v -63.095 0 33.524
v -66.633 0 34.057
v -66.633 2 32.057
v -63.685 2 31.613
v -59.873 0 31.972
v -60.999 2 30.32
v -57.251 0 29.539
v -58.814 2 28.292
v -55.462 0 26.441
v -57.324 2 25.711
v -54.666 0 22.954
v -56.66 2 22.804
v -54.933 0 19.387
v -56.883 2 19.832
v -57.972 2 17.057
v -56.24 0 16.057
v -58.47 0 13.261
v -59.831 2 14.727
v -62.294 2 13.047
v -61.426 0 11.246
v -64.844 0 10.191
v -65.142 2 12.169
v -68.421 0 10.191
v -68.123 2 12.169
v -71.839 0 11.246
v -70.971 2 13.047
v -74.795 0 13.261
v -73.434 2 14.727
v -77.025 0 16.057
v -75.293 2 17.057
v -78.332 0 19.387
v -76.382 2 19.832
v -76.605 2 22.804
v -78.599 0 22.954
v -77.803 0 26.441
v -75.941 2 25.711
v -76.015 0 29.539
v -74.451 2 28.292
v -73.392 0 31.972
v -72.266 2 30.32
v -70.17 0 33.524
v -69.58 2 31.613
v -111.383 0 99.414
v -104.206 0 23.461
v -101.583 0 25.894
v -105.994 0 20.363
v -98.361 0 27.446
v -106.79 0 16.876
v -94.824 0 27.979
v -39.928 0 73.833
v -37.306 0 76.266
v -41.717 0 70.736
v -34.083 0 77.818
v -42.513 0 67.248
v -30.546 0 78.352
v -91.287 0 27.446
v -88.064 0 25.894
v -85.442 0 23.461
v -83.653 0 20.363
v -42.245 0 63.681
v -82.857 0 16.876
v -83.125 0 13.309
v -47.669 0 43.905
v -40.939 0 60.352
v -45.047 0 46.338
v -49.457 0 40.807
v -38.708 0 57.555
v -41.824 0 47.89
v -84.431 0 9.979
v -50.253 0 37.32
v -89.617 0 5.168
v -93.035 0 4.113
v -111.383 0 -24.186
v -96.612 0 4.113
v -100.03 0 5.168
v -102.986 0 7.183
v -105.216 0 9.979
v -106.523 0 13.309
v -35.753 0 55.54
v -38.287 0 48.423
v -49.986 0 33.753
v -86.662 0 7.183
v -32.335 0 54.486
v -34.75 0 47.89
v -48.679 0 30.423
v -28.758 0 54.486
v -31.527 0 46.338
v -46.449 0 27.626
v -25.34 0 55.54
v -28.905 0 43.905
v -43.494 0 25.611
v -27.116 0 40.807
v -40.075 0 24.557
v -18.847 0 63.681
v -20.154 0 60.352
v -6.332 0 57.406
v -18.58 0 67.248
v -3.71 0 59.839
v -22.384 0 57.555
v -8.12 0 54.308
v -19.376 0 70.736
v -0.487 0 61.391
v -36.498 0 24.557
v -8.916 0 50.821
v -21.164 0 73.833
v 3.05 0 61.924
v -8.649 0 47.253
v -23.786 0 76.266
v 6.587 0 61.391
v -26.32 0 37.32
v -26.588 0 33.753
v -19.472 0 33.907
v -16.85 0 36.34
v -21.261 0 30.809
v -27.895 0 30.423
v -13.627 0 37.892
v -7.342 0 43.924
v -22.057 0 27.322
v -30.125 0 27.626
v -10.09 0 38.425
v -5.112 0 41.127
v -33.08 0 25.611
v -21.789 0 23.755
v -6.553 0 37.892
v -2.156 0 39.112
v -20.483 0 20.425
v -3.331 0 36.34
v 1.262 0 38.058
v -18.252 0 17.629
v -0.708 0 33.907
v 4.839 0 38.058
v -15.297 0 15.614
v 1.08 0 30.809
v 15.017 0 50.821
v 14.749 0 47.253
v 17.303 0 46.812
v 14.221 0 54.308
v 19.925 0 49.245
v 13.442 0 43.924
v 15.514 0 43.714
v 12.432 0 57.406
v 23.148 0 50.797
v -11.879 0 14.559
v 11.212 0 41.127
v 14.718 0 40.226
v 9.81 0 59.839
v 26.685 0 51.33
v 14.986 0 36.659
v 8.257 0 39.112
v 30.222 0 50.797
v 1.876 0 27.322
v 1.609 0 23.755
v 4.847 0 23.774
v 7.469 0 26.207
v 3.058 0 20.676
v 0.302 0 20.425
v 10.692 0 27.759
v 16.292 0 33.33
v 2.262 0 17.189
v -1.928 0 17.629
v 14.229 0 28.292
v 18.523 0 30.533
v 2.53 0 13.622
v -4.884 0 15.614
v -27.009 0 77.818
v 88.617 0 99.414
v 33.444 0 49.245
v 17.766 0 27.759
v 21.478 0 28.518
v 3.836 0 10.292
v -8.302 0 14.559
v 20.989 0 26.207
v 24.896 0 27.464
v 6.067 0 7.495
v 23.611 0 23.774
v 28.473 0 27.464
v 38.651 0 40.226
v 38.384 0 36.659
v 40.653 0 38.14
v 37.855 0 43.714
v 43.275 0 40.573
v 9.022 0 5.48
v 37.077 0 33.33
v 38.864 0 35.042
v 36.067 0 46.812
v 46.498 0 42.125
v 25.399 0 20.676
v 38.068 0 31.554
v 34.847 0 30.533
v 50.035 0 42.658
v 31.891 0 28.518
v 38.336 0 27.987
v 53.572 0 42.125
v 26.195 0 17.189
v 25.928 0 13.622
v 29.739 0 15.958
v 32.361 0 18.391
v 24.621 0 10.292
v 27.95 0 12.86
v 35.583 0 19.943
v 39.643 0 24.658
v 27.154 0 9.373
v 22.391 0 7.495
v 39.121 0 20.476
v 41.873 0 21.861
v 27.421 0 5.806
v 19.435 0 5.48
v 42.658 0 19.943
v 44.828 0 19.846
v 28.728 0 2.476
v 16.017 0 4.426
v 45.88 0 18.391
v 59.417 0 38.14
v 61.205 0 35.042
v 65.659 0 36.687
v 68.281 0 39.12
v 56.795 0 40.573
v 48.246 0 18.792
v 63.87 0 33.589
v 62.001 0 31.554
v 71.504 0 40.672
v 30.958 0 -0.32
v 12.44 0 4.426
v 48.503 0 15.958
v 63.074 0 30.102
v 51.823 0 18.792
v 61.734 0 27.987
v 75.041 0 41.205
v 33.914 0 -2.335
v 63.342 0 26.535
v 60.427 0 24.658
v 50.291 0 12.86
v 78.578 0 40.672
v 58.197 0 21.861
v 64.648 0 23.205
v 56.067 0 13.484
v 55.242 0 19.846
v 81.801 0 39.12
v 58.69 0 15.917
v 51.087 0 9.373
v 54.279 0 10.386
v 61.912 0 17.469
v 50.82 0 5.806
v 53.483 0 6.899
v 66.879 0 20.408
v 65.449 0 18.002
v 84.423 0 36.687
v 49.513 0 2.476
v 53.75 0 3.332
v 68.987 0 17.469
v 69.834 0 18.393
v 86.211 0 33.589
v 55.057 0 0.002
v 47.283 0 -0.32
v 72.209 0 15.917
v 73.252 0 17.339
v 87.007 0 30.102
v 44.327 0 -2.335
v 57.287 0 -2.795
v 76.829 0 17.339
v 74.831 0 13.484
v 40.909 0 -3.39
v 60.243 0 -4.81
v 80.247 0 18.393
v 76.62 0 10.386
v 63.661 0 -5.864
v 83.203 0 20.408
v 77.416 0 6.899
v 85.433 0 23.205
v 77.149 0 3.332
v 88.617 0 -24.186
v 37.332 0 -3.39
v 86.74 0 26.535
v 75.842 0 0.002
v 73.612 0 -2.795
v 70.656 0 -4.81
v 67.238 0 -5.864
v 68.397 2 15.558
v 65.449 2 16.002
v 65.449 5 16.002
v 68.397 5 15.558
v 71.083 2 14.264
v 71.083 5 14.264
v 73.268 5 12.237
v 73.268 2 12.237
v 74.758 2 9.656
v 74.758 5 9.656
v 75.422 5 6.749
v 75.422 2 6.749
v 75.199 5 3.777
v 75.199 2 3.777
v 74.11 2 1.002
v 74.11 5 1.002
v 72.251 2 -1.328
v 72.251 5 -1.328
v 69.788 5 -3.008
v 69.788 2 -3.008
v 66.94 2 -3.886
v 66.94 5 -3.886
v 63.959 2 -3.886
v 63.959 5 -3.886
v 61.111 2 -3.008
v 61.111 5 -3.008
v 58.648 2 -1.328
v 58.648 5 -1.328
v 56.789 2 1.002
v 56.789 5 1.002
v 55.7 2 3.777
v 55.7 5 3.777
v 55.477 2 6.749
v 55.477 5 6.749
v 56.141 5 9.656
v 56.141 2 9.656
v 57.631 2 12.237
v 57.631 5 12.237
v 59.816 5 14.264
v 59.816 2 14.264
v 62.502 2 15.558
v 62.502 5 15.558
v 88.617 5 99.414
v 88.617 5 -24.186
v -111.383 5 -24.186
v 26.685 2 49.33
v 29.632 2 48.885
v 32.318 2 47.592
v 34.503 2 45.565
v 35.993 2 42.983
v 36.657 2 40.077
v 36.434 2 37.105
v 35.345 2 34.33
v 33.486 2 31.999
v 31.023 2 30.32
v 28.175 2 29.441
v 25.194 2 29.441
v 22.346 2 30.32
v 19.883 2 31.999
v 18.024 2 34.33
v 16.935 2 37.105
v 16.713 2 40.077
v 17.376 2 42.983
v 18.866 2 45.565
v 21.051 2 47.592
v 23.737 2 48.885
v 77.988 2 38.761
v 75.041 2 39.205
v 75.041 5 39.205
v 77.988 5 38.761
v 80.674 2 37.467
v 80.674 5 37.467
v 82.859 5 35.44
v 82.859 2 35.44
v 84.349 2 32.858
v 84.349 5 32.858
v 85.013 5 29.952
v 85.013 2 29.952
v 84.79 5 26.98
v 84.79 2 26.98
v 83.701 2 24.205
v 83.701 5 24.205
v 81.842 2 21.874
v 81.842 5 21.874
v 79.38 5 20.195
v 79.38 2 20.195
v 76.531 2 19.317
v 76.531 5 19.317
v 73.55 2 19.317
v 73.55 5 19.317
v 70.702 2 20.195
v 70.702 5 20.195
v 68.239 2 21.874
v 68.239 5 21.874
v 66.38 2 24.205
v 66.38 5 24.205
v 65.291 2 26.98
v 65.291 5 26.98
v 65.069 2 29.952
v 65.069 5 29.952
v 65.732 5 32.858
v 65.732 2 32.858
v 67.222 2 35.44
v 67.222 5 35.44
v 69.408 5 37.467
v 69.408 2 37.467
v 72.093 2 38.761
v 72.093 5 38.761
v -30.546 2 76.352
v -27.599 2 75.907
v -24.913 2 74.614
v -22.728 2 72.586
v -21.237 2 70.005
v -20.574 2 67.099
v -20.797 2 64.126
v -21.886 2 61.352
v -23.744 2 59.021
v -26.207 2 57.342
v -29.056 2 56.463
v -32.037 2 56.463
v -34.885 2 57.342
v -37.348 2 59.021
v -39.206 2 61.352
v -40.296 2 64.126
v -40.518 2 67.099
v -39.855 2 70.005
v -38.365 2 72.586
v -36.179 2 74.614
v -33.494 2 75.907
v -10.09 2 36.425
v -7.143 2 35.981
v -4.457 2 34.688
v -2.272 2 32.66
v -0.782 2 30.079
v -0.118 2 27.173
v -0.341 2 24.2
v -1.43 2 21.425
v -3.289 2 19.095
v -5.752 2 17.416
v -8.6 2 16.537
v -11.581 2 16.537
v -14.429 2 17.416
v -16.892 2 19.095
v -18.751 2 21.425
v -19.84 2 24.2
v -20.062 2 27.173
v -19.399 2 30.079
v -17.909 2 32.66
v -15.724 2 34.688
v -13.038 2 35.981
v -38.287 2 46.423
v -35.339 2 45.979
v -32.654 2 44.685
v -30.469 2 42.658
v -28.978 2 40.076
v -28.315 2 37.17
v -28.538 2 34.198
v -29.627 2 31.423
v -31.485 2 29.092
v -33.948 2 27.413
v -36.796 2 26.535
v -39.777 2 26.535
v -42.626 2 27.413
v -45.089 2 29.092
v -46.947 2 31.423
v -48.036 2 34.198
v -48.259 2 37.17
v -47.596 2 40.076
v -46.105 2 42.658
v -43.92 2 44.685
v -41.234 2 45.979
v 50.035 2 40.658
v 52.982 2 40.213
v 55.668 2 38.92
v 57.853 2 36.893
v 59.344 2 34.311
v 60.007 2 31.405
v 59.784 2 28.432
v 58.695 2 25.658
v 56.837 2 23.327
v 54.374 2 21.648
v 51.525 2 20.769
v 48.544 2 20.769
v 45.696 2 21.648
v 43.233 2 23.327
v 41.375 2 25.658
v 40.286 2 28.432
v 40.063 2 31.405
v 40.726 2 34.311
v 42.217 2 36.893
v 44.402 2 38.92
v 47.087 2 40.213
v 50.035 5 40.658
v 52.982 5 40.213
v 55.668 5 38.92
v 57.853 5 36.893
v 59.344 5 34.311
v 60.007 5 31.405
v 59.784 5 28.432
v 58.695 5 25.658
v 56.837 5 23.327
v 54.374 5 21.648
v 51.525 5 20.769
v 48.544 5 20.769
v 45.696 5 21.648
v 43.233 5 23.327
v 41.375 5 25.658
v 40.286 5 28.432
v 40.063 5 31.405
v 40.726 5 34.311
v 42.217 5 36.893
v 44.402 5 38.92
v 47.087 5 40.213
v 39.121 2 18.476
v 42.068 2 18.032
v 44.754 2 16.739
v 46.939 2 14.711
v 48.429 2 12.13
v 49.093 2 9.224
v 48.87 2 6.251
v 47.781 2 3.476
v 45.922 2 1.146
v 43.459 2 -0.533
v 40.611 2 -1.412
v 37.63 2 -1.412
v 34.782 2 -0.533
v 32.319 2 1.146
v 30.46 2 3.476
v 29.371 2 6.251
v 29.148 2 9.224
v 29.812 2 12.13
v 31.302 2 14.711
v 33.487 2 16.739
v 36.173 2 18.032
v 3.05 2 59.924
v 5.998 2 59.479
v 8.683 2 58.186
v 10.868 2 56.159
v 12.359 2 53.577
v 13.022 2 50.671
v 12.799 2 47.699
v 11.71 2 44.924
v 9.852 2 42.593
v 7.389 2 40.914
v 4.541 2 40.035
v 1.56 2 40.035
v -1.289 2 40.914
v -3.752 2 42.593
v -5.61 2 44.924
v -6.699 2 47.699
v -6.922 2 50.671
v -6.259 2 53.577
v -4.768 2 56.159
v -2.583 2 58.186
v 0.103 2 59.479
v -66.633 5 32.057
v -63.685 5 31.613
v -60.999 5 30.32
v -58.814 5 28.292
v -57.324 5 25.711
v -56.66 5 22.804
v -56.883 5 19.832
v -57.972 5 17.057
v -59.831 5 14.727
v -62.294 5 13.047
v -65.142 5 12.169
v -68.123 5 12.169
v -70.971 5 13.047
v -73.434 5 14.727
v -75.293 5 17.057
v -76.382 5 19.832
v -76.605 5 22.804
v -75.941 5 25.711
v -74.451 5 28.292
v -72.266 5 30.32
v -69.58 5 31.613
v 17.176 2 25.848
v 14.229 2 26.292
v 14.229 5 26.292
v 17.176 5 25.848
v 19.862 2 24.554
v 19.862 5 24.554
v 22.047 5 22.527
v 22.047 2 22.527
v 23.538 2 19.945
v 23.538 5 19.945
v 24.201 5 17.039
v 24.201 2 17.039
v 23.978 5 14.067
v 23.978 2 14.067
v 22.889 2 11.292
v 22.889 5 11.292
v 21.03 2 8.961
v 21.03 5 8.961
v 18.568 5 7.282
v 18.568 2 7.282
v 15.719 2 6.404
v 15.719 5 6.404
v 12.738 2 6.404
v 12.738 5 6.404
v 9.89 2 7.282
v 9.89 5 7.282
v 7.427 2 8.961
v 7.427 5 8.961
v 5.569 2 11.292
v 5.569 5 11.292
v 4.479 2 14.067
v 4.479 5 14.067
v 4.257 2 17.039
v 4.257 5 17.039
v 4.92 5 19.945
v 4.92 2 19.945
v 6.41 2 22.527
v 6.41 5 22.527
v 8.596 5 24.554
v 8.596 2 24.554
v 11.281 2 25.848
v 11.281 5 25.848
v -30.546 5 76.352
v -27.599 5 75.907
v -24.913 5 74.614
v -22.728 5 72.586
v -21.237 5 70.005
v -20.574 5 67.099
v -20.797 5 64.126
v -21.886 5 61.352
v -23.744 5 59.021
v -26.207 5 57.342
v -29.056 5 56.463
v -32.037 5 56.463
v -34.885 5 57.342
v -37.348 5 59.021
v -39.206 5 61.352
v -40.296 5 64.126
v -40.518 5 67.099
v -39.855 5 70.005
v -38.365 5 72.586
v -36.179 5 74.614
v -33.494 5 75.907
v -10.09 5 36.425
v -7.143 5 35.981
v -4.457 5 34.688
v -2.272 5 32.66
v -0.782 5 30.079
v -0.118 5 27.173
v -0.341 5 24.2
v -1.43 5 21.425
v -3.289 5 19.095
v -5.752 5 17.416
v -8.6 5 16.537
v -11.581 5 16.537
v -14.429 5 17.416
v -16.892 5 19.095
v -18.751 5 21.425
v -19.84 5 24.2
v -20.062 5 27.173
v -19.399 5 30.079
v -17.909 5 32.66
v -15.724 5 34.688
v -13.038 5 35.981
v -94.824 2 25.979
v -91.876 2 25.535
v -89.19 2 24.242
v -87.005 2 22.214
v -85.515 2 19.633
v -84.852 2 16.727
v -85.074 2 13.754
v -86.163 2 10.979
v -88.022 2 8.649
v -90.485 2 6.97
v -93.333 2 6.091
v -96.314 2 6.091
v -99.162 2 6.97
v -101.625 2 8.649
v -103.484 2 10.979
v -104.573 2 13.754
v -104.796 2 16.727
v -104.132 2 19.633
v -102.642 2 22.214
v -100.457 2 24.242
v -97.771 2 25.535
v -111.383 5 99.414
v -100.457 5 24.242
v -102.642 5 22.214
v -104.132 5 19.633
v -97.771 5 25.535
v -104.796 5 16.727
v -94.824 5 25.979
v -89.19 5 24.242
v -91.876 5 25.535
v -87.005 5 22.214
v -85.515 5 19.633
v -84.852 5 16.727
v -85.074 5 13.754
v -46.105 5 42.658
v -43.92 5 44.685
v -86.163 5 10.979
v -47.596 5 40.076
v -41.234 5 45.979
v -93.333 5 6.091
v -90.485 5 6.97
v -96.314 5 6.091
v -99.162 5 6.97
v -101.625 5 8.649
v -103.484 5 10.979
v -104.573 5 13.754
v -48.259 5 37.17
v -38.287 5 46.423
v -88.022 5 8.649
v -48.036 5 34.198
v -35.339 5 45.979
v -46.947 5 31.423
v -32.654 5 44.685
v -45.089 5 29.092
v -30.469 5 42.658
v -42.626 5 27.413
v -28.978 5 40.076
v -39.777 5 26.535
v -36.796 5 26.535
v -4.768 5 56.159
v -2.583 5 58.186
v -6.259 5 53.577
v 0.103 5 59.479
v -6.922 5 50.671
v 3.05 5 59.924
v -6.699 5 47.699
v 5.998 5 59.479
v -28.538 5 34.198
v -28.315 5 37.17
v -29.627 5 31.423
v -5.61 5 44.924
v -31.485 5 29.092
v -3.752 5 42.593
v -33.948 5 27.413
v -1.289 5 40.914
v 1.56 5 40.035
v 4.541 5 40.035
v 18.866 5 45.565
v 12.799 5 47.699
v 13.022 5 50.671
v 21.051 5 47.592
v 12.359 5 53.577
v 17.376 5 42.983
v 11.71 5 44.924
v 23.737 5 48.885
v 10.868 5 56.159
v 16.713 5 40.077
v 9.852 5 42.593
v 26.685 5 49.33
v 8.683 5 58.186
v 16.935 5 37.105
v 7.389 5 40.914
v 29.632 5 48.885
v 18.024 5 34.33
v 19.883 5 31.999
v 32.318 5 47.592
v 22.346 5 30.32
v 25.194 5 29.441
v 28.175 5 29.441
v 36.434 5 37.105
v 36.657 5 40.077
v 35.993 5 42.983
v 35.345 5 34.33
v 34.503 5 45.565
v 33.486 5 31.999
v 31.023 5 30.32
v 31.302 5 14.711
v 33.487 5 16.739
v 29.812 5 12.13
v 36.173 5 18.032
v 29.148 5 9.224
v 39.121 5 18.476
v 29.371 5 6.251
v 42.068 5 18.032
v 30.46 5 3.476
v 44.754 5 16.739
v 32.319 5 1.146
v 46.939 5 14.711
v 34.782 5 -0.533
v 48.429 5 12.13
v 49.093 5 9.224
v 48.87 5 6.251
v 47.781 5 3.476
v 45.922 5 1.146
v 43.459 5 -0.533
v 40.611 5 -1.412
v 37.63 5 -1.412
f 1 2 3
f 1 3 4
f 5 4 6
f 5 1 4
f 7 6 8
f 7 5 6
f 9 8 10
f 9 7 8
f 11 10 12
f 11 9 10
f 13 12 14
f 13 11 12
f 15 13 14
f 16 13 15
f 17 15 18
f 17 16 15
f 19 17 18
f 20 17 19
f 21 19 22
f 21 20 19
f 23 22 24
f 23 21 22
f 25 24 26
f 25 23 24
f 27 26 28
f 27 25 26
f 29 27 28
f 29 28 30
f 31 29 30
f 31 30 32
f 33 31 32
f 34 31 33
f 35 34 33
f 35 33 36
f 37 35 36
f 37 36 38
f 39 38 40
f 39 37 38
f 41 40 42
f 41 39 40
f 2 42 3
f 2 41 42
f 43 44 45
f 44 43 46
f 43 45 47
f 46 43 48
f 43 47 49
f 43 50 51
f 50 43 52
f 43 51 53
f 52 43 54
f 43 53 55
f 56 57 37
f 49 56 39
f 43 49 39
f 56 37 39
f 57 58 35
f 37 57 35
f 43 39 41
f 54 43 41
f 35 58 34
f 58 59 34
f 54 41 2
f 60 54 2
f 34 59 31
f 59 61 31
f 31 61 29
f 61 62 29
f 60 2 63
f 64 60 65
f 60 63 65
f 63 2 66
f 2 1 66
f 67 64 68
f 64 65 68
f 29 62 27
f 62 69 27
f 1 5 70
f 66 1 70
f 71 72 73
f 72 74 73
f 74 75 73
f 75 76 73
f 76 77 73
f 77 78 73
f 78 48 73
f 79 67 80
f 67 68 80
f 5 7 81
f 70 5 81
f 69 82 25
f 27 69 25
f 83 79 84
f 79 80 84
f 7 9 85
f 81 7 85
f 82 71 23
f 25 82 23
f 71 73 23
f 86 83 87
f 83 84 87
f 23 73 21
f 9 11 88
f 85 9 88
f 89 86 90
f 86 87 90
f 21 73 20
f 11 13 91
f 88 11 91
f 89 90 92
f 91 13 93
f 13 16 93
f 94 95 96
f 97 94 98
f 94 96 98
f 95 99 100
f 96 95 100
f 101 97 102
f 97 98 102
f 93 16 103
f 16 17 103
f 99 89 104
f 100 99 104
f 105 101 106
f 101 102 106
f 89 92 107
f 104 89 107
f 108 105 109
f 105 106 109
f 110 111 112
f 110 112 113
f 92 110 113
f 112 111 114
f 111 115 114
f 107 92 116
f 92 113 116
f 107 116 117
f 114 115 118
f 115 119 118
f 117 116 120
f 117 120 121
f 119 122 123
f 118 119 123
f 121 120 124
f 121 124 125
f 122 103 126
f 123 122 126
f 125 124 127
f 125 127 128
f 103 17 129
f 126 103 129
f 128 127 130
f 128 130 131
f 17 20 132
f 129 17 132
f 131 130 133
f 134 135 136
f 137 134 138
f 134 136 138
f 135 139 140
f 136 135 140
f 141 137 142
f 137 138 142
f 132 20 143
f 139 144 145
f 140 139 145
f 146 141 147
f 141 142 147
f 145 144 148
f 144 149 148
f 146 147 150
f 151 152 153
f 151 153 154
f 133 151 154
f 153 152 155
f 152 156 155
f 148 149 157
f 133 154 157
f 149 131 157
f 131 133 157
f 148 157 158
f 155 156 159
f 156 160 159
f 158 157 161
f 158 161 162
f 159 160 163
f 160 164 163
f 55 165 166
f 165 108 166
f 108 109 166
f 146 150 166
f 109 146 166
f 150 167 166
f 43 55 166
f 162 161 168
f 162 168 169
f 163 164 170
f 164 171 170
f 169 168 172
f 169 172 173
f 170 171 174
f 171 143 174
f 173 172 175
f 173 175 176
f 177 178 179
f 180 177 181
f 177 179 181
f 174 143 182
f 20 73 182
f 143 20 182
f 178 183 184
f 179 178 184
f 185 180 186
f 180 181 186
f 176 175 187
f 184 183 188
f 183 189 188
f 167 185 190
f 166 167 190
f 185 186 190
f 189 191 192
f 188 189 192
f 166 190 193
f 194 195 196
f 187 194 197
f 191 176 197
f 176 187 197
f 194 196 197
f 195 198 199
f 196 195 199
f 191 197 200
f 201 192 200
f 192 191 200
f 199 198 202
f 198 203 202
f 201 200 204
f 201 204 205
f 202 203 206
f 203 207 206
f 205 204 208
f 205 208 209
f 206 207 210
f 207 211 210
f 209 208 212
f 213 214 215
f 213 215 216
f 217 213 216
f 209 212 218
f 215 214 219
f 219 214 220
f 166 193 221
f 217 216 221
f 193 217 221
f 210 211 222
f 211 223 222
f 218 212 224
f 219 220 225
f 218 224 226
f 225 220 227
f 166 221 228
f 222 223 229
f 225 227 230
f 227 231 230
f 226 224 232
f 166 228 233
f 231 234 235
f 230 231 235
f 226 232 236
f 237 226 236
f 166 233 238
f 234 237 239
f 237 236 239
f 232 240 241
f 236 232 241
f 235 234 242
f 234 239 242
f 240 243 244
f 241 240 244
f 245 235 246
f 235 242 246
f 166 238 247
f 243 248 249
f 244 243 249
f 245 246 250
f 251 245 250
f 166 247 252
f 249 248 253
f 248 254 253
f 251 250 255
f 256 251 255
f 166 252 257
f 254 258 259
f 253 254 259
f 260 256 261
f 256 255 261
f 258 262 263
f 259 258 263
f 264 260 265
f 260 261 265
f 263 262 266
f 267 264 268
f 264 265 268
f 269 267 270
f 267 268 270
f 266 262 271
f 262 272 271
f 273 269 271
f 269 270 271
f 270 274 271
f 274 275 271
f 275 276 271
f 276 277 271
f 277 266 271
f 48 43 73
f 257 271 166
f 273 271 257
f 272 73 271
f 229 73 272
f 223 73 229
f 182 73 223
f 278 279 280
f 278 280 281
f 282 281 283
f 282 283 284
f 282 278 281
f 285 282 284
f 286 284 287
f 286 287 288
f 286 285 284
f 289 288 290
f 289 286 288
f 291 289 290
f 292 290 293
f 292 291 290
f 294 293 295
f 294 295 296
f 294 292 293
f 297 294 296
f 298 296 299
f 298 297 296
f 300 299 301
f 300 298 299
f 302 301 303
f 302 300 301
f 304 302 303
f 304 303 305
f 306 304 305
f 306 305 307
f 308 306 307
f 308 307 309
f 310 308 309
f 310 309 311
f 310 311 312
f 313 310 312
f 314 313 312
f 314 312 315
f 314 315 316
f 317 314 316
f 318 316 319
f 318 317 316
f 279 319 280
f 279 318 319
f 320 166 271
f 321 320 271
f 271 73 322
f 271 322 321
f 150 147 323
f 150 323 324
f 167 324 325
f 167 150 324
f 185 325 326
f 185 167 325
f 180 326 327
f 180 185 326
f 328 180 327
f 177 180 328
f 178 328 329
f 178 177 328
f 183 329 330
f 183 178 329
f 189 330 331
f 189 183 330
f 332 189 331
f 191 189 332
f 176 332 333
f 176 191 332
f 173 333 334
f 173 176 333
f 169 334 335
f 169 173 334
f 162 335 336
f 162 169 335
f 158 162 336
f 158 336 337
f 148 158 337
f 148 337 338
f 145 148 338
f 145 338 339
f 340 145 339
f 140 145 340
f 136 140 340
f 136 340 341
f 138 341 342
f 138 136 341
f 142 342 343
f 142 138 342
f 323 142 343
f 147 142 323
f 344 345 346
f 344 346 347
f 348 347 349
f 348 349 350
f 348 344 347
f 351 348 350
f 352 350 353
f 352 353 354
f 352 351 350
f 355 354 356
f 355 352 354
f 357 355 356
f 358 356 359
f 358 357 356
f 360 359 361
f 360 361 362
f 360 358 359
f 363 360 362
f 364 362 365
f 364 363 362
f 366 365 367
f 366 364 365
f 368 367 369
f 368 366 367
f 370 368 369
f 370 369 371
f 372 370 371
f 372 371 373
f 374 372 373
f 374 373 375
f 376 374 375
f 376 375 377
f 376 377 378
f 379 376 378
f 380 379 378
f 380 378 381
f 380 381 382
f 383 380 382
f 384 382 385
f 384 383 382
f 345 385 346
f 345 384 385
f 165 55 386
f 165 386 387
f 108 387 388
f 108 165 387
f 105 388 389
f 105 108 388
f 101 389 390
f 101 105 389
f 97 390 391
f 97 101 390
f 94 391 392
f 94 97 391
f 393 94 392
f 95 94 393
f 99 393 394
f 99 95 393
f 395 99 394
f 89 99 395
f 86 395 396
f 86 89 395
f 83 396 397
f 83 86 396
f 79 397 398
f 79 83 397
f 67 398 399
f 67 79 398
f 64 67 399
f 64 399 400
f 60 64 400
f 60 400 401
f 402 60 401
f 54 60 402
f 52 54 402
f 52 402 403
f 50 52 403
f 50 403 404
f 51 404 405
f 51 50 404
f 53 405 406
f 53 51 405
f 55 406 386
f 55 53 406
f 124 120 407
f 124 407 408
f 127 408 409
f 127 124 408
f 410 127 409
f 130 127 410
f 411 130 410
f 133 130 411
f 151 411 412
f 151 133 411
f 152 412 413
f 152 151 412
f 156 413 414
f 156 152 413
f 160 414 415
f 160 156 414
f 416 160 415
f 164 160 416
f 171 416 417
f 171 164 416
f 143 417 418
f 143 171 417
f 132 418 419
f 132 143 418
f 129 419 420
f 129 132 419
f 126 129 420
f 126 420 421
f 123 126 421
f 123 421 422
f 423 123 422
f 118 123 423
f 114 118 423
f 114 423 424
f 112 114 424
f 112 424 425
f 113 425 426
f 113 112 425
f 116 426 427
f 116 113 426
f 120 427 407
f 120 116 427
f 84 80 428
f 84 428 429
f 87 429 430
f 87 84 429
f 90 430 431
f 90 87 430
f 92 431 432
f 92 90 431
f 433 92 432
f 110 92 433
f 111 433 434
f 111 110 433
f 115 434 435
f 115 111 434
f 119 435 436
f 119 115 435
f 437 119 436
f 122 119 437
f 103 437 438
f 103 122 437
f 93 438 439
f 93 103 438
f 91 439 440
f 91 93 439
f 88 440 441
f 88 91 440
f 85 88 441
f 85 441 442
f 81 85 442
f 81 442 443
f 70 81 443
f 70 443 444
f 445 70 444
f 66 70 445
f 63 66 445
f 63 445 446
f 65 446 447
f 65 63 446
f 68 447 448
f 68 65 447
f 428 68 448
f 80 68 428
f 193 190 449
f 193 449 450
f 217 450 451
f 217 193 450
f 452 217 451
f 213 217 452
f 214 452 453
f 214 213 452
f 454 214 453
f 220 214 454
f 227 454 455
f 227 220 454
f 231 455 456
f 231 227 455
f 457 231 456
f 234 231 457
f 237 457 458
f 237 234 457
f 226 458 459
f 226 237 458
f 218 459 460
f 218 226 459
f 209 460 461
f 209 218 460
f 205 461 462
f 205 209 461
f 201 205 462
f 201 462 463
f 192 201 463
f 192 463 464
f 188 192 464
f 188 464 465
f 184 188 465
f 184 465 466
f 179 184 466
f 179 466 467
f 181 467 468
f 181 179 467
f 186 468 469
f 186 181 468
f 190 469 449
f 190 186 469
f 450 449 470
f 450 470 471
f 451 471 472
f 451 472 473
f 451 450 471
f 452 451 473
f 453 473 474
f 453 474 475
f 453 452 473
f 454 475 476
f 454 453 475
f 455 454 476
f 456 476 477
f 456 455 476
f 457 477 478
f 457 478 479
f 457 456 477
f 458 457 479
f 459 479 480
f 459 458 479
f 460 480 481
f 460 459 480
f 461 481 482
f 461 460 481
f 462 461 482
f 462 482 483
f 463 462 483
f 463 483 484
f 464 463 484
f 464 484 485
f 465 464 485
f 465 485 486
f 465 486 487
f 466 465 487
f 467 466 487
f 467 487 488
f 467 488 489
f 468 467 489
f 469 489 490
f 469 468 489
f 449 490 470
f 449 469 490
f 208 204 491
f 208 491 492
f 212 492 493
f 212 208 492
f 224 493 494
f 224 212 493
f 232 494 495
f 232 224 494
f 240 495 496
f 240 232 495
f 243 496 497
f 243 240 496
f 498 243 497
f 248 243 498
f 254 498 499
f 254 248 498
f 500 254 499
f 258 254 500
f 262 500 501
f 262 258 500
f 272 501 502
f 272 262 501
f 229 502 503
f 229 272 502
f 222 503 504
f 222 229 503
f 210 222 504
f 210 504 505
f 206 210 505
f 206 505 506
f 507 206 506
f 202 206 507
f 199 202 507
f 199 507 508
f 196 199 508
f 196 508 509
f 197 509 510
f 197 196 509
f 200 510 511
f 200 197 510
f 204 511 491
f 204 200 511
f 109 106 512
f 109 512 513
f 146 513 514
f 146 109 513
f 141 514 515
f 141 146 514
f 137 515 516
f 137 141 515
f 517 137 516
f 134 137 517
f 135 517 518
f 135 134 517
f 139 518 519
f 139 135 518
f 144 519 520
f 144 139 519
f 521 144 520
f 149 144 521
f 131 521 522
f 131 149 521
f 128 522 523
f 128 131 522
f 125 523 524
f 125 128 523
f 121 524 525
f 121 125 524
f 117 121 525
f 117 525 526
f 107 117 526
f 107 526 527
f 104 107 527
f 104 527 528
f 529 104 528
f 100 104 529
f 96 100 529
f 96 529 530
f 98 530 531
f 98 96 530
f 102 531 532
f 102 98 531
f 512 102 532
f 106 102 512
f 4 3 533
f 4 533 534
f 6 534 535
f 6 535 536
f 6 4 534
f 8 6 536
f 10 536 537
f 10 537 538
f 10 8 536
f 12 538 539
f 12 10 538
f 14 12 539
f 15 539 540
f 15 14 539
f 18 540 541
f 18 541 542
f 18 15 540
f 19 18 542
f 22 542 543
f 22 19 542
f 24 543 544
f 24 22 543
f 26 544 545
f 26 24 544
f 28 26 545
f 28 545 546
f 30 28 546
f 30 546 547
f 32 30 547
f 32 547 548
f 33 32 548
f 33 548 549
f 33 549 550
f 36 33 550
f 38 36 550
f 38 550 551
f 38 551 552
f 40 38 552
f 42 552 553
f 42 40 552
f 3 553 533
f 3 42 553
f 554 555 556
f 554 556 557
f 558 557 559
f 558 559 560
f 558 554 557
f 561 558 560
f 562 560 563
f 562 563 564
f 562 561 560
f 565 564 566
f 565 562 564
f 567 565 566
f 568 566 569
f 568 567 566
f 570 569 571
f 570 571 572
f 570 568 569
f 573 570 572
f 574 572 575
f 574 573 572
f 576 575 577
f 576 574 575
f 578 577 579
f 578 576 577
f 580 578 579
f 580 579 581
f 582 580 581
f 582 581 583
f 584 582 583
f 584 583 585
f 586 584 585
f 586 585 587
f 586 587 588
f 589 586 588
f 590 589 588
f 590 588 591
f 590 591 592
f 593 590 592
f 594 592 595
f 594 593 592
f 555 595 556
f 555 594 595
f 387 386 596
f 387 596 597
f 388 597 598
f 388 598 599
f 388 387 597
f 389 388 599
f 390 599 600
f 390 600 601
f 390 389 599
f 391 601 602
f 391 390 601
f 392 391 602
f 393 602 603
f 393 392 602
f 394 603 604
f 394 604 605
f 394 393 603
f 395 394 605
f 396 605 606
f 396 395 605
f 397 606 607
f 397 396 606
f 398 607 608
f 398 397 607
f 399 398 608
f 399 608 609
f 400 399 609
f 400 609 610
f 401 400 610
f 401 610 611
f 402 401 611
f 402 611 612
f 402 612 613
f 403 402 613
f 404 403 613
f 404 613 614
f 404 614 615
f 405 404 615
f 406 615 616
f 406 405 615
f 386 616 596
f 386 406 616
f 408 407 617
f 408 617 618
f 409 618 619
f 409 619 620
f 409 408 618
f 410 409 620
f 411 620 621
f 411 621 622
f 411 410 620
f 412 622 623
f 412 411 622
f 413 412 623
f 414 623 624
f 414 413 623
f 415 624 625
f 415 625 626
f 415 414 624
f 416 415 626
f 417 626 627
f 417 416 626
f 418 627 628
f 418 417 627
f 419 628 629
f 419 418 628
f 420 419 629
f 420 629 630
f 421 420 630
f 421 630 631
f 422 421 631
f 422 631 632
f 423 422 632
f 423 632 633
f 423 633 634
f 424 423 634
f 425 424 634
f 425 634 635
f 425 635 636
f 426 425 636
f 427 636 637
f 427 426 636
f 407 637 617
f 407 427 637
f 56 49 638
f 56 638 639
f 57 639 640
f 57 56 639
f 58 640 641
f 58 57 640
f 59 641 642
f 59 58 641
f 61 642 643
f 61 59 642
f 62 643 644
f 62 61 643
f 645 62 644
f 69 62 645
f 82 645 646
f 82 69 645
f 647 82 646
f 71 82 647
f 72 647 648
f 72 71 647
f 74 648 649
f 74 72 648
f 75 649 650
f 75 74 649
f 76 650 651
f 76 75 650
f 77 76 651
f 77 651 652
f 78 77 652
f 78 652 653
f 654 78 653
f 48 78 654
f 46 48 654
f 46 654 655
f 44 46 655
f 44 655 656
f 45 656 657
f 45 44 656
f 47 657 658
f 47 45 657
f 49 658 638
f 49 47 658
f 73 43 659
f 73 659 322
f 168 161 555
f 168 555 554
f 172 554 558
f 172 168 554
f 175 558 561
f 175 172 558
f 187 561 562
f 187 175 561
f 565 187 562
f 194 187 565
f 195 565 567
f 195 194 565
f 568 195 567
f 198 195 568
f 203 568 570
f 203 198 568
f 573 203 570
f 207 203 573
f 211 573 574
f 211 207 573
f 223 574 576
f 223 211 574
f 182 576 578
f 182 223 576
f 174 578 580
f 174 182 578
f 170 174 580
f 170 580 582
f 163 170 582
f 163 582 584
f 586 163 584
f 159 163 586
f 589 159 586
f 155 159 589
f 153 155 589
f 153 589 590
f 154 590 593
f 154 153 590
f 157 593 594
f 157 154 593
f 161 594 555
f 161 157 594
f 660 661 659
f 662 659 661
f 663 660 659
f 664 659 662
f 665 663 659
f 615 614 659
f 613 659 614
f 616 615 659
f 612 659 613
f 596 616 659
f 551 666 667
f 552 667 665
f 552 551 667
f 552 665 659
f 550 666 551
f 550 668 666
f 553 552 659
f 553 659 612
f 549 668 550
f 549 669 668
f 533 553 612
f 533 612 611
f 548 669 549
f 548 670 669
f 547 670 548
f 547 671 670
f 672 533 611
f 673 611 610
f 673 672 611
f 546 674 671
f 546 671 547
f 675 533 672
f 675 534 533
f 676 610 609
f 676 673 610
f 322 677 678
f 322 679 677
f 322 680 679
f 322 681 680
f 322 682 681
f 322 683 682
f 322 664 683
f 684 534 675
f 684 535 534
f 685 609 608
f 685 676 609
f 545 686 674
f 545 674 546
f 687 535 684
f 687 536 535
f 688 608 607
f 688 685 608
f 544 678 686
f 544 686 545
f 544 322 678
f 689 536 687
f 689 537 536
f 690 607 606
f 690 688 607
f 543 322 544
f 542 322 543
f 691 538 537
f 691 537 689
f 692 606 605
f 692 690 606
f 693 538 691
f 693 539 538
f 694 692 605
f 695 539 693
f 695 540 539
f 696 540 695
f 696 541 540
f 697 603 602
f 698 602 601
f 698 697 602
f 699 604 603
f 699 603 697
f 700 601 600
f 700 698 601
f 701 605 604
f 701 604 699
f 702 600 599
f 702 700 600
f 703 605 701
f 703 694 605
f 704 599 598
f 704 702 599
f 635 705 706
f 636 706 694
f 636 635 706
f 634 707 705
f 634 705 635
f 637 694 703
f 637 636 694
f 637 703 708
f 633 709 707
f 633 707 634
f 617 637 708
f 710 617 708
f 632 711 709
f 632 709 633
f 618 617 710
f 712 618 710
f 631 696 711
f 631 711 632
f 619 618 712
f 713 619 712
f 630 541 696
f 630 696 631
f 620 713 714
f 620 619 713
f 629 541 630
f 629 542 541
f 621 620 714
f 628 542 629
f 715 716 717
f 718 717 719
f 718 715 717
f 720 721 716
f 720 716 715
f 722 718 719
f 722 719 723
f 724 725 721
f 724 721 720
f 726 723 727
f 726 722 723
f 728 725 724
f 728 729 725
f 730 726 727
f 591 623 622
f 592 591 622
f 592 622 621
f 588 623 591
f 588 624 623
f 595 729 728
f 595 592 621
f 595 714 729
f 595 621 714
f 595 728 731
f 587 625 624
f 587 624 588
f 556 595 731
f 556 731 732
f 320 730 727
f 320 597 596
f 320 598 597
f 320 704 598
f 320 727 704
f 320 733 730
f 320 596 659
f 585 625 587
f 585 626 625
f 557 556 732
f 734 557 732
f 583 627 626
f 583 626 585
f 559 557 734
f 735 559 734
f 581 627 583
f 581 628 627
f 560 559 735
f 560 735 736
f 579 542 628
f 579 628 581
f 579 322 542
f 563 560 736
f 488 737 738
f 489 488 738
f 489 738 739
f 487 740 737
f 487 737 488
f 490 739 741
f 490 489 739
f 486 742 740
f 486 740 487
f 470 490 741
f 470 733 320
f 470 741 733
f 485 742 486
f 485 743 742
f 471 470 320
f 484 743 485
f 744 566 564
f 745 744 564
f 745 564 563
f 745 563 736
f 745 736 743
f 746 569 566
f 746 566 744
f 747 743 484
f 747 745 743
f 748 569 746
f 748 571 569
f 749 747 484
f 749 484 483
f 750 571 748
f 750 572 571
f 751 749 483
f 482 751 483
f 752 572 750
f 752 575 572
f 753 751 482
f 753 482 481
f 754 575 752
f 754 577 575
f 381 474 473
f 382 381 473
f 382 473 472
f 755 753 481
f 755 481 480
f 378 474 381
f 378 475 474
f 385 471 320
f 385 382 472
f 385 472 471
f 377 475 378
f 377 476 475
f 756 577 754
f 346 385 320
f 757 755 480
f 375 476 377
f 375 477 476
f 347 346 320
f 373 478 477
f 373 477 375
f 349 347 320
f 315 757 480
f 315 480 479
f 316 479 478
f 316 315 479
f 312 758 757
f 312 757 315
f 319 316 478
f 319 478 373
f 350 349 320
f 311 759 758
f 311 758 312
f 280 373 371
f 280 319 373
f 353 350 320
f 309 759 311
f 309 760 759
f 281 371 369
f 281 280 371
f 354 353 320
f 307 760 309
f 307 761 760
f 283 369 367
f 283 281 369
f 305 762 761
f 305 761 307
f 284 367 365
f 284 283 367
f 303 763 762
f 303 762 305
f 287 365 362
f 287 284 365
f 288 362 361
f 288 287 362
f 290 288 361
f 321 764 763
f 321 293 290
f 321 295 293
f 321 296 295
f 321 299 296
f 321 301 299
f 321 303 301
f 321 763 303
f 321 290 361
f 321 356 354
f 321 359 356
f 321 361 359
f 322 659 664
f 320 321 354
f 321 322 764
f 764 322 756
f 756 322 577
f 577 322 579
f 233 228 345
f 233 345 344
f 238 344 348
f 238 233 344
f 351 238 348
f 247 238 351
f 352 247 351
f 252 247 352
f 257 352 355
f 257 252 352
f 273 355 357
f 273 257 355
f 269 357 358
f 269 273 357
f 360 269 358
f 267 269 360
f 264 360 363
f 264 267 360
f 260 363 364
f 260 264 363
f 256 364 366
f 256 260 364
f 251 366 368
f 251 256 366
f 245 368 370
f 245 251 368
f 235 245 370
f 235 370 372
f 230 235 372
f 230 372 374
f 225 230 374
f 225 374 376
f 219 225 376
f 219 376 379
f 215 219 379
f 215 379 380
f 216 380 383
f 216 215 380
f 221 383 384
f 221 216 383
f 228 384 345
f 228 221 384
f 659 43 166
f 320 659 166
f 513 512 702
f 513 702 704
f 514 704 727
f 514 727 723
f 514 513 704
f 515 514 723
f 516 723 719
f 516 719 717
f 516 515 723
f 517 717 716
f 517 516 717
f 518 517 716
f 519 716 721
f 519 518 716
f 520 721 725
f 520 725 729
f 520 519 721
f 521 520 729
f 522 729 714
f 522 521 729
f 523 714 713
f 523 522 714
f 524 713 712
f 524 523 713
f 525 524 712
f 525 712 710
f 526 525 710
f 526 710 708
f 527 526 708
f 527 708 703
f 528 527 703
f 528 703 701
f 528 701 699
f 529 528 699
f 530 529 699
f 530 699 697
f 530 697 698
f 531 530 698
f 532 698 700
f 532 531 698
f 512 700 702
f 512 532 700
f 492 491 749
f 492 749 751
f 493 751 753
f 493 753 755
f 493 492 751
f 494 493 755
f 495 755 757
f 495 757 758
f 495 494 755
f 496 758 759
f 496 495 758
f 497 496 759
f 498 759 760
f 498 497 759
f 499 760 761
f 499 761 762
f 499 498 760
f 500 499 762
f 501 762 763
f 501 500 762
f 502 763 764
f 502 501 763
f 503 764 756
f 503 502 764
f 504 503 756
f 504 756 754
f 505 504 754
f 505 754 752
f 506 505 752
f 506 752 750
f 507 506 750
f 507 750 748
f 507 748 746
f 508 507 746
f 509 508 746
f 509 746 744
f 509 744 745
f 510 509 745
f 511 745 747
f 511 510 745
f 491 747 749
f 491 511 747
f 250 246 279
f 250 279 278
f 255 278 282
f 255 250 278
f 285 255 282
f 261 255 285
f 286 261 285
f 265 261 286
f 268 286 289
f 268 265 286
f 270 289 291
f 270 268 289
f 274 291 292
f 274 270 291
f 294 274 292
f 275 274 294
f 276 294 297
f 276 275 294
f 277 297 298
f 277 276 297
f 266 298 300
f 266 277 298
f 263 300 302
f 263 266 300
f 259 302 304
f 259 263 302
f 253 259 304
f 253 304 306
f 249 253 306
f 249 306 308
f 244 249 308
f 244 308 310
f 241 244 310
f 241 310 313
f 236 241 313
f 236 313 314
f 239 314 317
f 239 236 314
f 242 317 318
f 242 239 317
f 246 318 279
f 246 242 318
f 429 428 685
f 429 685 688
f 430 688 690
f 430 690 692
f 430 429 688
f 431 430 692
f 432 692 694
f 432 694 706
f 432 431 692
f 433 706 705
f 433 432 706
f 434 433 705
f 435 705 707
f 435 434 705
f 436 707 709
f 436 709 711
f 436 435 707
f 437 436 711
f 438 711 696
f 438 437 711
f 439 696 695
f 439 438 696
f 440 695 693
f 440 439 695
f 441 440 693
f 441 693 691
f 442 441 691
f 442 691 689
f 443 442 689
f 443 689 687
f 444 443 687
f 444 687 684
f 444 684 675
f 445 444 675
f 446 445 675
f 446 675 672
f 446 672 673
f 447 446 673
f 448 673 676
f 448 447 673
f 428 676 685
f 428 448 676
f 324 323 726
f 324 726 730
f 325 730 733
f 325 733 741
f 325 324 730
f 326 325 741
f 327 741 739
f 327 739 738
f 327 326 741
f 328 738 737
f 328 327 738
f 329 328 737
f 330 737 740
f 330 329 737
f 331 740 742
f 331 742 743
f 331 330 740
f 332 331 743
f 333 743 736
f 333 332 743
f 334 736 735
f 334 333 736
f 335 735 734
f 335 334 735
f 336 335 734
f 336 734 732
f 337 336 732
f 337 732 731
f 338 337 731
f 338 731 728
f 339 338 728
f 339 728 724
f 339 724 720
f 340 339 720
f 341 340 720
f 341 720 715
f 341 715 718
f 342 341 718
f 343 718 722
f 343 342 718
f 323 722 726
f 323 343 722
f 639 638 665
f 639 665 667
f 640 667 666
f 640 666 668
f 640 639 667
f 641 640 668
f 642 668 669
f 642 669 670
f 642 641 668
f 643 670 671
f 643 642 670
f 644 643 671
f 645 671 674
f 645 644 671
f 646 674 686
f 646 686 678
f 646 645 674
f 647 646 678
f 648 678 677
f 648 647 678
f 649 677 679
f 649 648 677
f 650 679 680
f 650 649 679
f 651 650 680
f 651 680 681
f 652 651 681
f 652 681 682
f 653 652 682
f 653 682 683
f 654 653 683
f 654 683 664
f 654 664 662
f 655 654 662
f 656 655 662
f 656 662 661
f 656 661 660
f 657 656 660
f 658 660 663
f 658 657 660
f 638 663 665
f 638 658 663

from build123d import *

# Parameters (mm, degrees)
SKETCH1_W           = 200
SKETCH1_H           = 123.6
SKETCH1_R           = 10
BOSS_EXTRUDE1_DEPTH = 5
CHAMFER1_SIZE       = 2


with BuildPart() as part:
    # Sketch1 → Boss-Extrude1 (new body)
    with BuildSketch(Plane(origin=(0, 0, 0), x_dir=(1, 0, 0), z_dir=(0, 1, 0))):
        with Locations((-11.382571905, -37.613815878)):
            Rectangle(SKETCH1_W, SKETCH1_H)
        with Locations(Location((-30.546222192, -66.351509684, 0), (0, 0, 270))):
            Circle(SKETCH1_R, mode=Mode.SUBTRACT)
        with Locations(Location((-66.632534539, -22.057178609, 0), (0, 0, 270))):
            Circle(SKETCH1_R, mode=Mode.SUBTRACT)
        with Locations(Location((-94.823650655, -15.979370187, 0), (0, 0, 270))):
            Circle(SKETCH1_R, mode=Mode.SUBTRACT)
        with Locations(Location((-10.090347172, -26.425303761, 0), (0, 0, 270))):
            Circle(SKETCH1_R, mode=Mode.SUBTRACT)
        with Locations(Location((65.449469323, -6.002101711, 0), (0, 0, 270))):
            Circle(SKETCH1_R, mode=Mode.SUBTRACT)
        with Locations(Location((39.120524561, -8.47636758, 0), (0, 0, 270))):
            Circle(SKETCH1_R, mode=Mode.SUBTRACT)
        with Locations(Location((3.050131898, -49.923740932, 0), (0, 0, 270))):
            Circle(SKETCH1_R, mode=Mode.SUBTRACT)
        with Locations(Location((26.684644812, -39.329734959, 0), (0, 0, 270))):
            Circle(SKETCH1_R, mode=Mode.SUBTRACT)
        with Locations(Location((50.034895937, -30.657694114, 0), (0, 0, 270))):
            Circle(SKETCH1_R, mode=Mode.SUBTRACT)
        with Locations(Location((-38.286901535, -36.422907606, 0), (0, 0, 270))):
            Circle(SKETCH1_R, mode=Mode.SUBTRACT)
        with Locations(Location((75.040753418, -29.205017129, 0), (0, 0, 270))):
            Circle(SKETCH1_R, mode=Mode.SUBTRACT)
        with Locations(Location((14.228770638, -16.291965116, 0), (0, 0, 270))):
            Circle(SKETCH1_R, mode=Mode.SUBTRACT)
    extrude(amount=BOSS_EXTRUDE1_DEPTH)

    # Chamfer1
    chamfer1_edges = [part.edges().sort_by_distance(p)[0] for p in [
        (-30.546222192, 0, 56.351509684),
        (-66.632534539, 0, 12.057178609),
        (-94.823650655, 0, 5.979370187),
        (-10.090347172, 0, 16.425303761),
        (65.449469323, 0, -3.997898289),
        (39.120524561, 0, -1.52363242),
        (3.050131898, 0, 39.923740932),
        (26.684644812, 0, 29.329734959),
        (50.034895937, 0, 20.657694114),
        (-38.286901535, 0, 26.422907606),
        (75.040753418, 0, 19.205017129),
        (14.228770638, 0, 6.291965116),
    ]]
    chamfer(chamfer1_edges, length=CHAMFER1_SIZE)


solid = part.part
